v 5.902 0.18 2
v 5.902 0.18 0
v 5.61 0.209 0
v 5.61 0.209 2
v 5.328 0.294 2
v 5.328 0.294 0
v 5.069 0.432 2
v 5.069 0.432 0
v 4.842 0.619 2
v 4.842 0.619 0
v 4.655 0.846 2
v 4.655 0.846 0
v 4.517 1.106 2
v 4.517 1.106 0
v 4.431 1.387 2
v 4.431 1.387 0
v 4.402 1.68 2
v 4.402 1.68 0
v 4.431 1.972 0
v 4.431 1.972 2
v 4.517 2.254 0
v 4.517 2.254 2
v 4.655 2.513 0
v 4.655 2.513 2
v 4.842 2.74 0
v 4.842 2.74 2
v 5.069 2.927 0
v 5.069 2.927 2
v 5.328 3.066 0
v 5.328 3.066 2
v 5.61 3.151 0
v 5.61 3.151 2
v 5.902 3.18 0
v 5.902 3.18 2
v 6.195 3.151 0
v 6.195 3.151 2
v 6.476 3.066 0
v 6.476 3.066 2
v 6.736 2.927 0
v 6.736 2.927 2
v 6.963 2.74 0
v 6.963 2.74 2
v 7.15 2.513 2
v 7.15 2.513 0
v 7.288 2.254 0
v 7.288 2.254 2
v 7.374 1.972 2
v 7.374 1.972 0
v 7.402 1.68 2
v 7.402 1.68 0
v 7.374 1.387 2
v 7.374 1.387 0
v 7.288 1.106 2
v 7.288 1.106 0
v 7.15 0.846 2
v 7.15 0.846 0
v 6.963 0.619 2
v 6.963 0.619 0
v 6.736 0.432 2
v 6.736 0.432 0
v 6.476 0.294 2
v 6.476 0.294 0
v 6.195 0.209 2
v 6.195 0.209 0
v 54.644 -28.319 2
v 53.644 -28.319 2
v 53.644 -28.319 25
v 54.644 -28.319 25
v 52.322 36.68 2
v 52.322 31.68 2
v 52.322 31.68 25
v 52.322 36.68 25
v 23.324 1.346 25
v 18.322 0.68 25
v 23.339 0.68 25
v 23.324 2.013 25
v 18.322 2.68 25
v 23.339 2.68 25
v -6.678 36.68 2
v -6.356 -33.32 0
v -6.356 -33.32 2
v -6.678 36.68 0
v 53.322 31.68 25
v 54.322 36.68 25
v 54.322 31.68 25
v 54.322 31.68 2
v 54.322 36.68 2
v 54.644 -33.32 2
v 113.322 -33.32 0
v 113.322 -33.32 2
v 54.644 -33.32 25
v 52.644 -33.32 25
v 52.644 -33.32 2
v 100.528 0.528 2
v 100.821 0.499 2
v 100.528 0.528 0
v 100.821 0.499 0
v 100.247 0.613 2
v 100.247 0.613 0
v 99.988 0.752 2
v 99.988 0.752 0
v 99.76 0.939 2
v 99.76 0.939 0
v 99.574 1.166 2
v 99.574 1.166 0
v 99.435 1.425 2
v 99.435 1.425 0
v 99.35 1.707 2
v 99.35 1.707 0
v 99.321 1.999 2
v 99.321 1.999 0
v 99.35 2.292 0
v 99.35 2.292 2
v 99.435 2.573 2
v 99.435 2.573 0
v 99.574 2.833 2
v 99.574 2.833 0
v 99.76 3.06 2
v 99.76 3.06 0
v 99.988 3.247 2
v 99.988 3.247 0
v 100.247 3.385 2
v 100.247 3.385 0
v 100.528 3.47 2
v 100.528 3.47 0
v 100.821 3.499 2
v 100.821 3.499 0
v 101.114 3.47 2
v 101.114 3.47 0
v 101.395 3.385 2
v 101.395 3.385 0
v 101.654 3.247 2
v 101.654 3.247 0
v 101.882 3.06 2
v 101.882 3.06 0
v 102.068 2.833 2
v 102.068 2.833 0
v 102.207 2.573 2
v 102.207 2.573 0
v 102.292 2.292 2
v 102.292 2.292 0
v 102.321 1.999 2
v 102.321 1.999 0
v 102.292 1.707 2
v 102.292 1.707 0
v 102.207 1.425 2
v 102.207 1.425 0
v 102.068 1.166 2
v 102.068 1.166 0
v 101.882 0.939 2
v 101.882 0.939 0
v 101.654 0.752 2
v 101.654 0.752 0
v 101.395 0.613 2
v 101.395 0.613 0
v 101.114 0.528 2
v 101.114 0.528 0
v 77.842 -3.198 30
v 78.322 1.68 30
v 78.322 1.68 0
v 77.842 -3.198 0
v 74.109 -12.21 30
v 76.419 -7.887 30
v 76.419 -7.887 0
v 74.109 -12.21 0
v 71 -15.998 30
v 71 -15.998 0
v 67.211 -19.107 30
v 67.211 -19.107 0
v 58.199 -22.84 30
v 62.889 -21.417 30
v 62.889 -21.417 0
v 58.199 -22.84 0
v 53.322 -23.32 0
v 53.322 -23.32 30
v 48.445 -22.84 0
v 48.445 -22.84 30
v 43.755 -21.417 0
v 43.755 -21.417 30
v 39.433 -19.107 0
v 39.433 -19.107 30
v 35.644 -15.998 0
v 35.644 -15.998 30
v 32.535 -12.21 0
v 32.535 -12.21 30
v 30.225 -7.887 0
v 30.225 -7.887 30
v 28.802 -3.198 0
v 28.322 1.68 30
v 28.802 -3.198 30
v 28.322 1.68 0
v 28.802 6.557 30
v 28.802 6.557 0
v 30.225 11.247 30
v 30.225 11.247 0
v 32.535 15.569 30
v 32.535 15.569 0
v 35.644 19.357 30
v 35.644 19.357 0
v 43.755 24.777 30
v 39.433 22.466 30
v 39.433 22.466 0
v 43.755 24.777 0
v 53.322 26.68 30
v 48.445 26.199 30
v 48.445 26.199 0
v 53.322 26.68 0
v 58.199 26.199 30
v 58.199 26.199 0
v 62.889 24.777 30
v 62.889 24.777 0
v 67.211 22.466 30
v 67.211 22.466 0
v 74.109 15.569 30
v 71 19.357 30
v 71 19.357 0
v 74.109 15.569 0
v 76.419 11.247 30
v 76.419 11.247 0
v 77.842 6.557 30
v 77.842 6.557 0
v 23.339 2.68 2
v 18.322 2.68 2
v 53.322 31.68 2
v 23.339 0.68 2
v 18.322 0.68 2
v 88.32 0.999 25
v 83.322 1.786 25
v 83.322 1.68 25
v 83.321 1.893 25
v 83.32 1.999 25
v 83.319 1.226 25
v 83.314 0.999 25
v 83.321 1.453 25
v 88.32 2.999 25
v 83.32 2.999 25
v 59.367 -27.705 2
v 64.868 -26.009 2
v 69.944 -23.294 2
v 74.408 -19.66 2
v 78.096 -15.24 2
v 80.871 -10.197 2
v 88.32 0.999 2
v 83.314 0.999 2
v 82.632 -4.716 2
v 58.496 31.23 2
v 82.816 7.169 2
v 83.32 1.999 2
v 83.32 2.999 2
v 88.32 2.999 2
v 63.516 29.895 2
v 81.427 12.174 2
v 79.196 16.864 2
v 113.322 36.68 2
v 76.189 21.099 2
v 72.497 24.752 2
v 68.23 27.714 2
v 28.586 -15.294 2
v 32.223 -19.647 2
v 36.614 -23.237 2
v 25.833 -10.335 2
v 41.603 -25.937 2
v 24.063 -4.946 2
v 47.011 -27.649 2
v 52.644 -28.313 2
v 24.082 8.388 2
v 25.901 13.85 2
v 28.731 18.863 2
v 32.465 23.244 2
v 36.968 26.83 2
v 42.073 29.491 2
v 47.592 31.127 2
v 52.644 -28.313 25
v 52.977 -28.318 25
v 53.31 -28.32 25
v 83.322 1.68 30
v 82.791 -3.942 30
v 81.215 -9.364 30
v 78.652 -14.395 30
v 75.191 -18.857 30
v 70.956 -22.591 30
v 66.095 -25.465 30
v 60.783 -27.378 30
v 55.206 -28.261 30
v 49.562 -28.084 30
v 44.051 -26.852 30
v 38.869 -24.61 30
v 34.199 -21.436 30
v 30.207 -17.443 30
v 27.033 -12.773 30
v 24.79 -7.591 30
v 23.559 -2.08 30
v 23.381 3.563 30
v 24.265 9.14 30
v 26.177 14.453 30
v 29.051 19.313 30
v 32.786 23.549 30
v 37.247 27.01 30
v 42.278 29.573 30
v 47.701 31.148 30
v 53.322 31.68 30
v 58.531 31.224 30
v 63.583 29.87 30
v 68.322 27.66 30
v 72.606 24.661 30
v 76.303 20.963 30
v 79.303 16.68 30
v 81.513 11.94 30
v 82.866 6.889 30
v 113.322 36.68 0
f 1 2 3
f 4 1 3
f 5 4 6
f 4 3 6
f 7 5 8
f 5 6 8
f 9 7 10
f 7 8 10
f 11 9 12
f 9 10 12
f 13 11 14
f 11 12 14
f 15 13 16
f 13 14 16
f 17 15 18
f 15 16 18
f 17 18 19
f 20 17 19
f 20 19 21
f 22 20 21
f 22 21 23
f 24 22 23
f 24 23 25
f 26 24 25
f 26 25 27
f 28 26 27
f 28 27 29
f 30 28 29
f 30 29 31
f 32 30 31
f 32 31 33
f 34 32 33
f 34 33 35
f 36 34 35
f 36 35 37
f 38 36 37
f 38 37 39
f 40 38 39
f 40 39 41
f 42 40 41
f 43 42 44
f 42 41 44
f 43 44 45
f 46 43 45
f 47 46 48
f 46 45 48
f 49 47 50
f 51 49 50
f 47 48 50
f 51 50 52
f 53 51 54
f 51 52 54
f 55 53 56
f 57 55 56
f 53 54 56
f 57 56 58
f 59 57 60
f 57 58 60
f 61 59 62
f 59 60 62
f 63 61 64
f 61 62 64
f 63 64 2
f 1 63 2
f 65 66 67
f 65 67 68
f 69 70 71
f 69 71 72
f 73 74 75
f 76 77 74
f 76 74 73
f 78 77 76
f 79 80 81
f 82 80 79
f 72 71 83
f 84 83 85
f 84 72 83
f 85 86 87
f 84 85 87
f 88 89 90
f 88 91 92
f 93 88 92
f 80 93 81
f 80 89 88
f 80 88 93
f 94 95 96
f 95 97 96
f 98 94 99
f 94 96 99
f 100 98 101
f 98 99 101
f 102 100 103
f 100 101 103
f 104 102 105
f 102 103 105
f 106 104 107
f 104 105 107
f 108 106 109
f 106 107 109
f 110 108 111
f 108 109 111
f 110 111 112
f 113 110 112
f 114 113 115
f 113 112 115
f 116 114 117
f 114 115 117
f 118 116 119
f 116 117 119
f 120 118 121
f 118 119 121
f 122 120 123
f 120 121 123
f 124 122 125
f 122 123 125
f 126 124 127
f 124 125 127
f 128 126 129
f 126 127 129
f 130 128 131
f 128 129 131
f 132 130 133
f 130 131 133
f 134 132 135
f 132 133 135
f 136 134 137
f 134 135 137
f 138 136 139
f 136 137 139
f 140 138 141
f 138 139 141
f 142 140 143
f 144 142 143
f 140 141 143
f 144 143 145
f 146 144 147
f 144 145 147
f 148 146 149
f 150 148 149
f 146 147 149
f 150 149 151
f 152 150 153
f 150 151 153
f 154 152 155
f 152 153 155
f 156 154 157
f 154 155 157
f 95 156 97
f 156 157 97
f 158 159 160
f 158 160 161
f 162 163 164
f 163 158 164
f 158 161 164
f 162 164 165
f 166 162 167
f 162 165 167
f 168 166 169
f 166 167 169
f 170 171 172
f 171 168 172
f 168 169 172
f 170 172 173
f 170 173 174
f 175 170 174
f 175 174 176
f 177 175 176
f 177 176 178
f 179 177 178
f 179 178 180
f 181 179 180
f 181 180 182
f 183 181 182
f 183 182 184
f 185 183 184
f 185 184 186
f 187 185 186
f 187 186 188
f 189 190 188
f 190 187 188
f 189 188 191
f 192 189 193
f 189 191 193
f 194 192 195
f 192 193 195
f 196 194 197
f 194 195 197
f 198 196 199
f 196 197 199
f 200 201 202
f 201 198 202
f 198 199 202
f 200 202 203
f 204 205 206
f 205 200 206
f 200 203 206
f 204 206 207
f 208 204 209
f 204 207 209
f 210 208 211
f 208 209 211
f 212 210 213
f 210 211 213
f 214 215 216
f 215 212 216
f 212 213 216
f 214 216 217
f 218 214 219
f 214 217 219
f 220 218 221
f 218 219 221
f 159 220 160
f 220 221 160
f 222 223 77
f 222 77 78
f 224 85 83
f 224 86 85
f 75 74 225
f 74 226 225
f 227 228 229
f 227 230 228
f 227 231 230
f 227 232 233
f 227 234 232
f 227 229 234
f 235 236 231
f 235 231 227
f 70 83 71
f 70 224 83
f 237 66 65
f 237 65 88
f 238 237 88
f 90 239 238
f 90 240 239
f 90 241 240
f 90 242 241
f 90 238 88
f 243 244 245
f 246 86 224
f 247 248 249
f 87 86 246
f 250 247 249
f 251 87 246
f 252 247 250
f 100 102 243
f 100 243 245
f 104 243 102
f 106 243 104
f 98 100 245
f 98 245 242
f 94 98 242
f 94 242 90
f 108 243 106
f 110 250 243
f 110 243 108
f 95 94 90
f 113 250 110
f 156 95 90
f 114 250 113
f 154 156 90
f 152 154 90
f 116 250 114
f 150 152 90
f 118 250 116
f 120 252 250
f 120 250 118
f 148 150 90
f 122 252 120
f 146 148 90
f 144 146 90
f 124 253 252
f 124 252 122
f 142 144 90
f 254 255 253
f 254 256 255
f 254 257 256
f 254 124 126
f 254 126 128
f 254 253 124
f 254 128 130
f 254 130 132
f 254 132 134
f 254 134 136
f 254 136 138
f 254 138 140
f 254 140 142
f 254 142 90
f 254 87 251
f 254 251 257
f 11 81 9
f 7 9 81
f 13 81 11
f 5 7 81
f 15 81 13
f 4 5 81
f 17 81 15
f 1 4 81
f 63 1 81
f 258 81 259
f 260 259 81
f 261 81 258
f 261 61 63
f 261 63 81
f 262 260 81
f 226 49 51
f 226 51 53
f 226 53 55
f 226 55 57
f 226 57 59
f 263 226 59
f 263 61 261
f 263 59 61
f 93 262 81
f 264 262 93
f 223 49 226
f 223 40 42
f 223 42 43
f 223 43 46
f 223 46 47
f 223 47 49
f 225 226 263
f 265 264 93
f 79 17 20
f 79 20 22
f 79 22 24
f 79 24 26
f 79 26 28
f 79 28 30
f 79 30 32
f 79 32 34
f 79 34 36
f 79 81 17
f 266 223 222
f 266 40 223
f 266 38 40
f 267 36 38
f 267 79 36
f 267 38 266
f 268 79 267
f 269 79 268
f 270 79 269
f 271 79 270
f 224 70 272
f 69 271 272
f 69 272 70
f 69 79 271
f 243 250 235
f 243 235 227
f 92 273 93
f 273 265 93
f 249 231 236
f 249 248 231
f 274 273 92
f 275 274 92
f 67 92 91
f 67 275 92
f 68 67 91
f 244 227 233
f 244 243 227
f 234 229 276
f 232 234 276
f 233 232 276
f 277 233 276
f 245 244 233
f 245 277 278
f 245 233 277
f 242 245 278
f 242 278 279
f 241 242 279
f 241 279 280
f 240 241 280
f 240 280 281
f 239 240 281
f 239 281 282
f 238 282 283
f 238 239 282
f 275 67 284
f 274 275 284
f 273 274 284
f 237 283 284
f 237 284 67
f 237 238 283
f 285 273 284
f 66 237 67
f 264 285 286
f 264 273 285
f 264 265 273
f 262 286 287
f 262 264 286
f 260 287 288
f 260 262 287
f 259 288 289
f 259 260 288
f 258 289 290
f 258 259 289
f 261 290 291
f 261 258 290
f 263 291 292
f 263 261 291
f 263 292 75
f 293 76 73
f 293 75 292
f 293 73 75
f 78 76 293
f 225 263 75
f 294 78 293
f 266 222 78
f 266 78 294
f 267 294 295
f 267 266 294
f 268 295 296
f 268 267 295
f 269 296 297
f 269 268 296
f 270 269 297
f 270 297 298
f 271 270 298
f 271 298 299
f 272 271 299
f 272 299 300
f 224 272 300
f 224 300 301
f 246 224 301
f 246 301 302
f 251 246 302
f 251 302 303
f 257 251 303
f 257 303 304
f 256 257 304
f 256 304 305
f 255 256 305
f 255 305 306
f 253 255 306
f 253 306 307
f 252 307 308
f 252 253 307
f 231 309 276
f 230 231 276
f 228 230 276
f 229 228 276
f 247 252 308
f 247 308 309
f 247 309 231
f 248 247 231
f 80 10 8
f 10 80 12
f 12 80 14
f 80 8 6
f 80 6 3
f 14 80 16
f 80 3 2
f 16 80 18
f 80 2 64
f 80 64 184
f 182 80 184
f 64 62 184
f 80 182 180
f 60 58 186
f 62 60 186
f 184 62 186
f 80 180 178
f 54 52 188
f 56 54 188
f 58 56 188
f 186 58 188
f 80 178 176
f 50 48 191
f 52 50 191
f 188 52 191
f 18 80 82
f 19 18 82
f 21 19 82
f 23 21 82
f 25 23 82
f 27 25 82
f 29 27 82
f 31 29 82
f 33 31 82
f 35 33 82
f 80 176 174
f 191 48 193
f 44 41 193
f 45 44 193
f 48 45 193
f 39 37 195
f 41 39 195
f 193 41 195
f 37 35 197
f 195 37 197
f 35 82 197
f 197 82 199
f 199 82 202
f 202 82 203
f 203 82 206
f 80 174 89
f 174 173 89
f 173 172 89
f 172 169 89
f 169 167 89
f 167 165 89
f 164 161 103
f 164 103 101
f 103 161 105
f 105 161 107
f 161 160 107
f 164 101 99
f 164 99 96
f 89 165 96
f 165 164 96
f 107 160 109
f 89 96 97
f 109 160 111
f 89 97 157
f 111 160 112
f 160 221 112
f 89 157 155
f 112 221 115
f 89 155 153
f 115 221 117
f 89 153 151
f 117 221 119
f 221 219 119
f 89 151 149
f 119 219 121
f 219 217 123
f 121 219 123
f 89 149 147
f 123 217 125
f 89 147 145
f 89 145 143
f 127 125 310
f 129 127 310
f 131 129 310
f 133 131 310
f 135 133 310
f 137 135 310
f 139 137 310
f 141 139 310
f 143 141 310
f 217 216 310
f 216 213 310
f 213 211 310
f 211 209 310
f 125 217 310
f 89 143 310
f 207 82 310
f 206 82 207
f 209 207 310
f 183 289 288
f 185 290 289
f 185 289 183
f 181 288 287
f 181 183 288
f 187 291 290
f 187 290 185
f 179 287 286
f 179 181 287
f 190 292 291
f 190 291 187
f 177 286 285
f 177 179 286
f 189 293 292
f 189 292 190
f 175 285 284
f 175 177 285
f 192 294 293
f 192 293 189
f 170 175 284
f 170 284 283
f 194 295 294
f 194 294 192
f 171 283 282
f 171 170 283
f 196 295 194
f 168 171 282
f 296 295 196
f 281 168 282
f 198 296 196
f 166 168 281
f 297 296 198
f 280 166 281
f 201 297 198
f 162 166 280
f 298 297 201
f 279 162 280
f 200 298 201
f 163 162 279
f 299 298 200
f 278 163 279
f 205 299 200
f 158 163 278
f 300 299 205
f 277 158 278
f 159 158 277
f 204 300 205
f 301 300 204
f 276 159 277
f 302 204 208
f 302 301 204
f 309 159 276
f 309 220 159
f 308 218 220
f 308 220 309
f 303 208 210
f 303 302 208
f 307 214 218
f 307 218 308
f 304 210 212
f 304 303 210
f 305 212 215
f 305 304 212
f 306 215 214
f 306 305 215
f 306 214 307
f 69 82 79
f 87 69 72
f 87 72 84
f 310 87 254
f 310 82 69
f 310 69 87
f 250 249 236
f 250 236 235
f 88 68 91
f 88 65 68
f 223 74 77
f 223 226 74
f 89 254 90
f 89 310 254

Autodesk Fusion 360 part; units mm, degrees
sketch "Boceto1" plane through (0, 0, 0) normal (0, 0, 1) x (1, 0, 0)
  circle A0 centre (53.322, 1.6797) radius 25
  circle A1 centre (53.322, 1.6797) radius 30
  line L0 (53.322, 36.6797) -> (113.322, 36.6797)
  line L1 (74.1438, -33.3203) -> (-6.3562, -33.3203)
  line L2 (-6.3562, -33.3203) -> (-6.678, 36.6797)
  line L3 (53.322, 36.6797) -> (-6.678, 36.6797)
  line L4 (53.322, 1.6797) -> (53.322, 36.6797)
  line L5 (113.322, 36.6797) -> (113.322, -33.3203)
  line L6 (113.322, -33.3203) -> (74.1438, -33.3203)
  line L7 (53.322, 31.6797) -> (54.322, 31.6797)
  line L8 (54.322, 31.6797) -> (54.322, 36.6797)
  line L9 (53.322, 31.6797) -> (52.322, 31.6797)
  line L10 (52.322, 31.6797) -> (52.322, 36.6797)
  line L11 (53.6438, -28.3186) -> (54.6438, -28.3186)
  line L12 (54.6438, -28.3186) -> (54.6438, -33.3203)
  line L13 (54.6438, -33.3203) -> (52.6438, -33.3203)
  line L14 (52.6438, -28.3127) -> (52.6438, -33.3203)
  line L15 (83.3203, 1.9993) -> (83.3203, 2.9993)
  line L16 (83.3203, 2.9993) -> (88.3203, 2.9993)
  line L17 (88.3203, 2.9993) -> (88.3203, 0.9993)
  line L18 (88.3203, 0.9993) -> (83.3143, 0.9993)
  line L19 (23.322, 1.6797) -> (18.322, 1.6797)
  line L20 (18.322, 1.6797) -> (18.322, 2.6797)
  line L21 (18.322, 2.6797) -> (23.3386, 2.6797)
  line L22 (18.322, 1.6797) -> (18.322, 0.6797)
  line L23 (18.322, 0.6797) -> (23.3386, 0.6797)
  dimension "d1" = 50
  dimension "d2" = 60
  dimension "d4" = 60
  dimension "d5" = 60
  dimension "d6" = 80.5
  dimension "d7" = 70
  dimension "d16" = 35
  dimension "d28" = 1
  dimension "d29" = 1
  dimension "d32" = 1
  dimension "d33" = 2
  dimension "d34" = 1
  dimension "d35" = 5
  dimension "d36" = 2
  dimension "d37" = 5
  dimension "d38" = 1
  dimension "d39" = 1
extrude "Extruir1" add sketch "Boceto1" along normal blind 30 contours A1 makes body 1
sketch "Boceto4" plane through (0, 0, 0) normal (0, 0, 1) x (1, 0, 0)
extrude "Extruir7" add sketch "Boceto1" along normal blind 25 separate body contours L3 L4 L9 L10 | L0 L4 L7 L8 makes body 2
extrude "Extruir8" add sketch "Boceto1" along normal blind 25 contours A1 L15 L16 L17 L18 | A1 L19 L20 L21 | A1 L19 L22 L23 | A1 L1 L11 L12 L13 L14 bodies 1
extrude "Extruir9" add sketch "Boceto1" along normal blind 2 contours A1 L1 L2 L3 L9 L10 L14 L20 L21 L22 L23 | A1 L0 L1 L5 L6 L7 L8 L11 L12 L15 L16 L17 L18 bodies 1 2
sketch "Boceto6" plane through (0, 0, 2) normal (0, 0, 1) x (-1, 0, 0)
  line L0 (-18.322, -0.6797) -> (-18.322, -2.6797)
  line L1 (-18.322, -2.6797) -> (-23.3386, -2.6797)
  arc A0 (-53.322, -31.6797) -> (-23.3386, -2.6797) centre (-53.322, -1.6797) ccw
  line L2 (-53.322, -31.6797) -> (-52.322, -31.6797)
  line L3 (-52.322, -31.6797) -> (-52.322, -36.6797)
  line L4 (-52.322, -36.6797) -> (6.678, -36.6797)
  line L5 (6.678, -36.6797) -> (6.3562, 33.3203)
  line L6 (6.3562, 33.3203) -> (-52.6438, 33.3203)
  line L7 (-52.6438, 33.3203) -> (-52.6438, 28.3127)
  arc A1 (-23.3386, -0.6797) -> (-52.6438, 28.3127) centre (-53.322, -1.6797) ccw
  line L8 (-23.3386, -0.6797) -> (-18.322, -0.6797)
  line L9 (-18.322, -1.6797) -> (6.5171, -1.6797)
  circle A2 centre (-5.9024, -1.6797) radius 2.5
  line L10 (-88.3203, -2.9993) -> (-88.3203, -0.9993)
  line L11 (-113.322, 33.3203) -> (-113.322, -36.6797)
  line L12 (-88.3203, -1.9993) -> (-113.322, -1.9993)
  circle A3 centre (-100.8211, -1.9993) radius 2.5
  point P0 (-18.322, -1.6797)
  dimension "d44" = 5
  dimension "d45" = 5
hole "Agujero2" at (100.8211, 1.9993, 2) direction (0, 0, -1) diameter 3 depth 10 tip angle 180 bodies 1
hole "Agujero3" at (5.9024, 1.6797, 2) direction (0, 0, -1) diameter 3 depth 10 tip angle 180 bodies 1
equation "d6 = 60 mm + 20.5 mm"
